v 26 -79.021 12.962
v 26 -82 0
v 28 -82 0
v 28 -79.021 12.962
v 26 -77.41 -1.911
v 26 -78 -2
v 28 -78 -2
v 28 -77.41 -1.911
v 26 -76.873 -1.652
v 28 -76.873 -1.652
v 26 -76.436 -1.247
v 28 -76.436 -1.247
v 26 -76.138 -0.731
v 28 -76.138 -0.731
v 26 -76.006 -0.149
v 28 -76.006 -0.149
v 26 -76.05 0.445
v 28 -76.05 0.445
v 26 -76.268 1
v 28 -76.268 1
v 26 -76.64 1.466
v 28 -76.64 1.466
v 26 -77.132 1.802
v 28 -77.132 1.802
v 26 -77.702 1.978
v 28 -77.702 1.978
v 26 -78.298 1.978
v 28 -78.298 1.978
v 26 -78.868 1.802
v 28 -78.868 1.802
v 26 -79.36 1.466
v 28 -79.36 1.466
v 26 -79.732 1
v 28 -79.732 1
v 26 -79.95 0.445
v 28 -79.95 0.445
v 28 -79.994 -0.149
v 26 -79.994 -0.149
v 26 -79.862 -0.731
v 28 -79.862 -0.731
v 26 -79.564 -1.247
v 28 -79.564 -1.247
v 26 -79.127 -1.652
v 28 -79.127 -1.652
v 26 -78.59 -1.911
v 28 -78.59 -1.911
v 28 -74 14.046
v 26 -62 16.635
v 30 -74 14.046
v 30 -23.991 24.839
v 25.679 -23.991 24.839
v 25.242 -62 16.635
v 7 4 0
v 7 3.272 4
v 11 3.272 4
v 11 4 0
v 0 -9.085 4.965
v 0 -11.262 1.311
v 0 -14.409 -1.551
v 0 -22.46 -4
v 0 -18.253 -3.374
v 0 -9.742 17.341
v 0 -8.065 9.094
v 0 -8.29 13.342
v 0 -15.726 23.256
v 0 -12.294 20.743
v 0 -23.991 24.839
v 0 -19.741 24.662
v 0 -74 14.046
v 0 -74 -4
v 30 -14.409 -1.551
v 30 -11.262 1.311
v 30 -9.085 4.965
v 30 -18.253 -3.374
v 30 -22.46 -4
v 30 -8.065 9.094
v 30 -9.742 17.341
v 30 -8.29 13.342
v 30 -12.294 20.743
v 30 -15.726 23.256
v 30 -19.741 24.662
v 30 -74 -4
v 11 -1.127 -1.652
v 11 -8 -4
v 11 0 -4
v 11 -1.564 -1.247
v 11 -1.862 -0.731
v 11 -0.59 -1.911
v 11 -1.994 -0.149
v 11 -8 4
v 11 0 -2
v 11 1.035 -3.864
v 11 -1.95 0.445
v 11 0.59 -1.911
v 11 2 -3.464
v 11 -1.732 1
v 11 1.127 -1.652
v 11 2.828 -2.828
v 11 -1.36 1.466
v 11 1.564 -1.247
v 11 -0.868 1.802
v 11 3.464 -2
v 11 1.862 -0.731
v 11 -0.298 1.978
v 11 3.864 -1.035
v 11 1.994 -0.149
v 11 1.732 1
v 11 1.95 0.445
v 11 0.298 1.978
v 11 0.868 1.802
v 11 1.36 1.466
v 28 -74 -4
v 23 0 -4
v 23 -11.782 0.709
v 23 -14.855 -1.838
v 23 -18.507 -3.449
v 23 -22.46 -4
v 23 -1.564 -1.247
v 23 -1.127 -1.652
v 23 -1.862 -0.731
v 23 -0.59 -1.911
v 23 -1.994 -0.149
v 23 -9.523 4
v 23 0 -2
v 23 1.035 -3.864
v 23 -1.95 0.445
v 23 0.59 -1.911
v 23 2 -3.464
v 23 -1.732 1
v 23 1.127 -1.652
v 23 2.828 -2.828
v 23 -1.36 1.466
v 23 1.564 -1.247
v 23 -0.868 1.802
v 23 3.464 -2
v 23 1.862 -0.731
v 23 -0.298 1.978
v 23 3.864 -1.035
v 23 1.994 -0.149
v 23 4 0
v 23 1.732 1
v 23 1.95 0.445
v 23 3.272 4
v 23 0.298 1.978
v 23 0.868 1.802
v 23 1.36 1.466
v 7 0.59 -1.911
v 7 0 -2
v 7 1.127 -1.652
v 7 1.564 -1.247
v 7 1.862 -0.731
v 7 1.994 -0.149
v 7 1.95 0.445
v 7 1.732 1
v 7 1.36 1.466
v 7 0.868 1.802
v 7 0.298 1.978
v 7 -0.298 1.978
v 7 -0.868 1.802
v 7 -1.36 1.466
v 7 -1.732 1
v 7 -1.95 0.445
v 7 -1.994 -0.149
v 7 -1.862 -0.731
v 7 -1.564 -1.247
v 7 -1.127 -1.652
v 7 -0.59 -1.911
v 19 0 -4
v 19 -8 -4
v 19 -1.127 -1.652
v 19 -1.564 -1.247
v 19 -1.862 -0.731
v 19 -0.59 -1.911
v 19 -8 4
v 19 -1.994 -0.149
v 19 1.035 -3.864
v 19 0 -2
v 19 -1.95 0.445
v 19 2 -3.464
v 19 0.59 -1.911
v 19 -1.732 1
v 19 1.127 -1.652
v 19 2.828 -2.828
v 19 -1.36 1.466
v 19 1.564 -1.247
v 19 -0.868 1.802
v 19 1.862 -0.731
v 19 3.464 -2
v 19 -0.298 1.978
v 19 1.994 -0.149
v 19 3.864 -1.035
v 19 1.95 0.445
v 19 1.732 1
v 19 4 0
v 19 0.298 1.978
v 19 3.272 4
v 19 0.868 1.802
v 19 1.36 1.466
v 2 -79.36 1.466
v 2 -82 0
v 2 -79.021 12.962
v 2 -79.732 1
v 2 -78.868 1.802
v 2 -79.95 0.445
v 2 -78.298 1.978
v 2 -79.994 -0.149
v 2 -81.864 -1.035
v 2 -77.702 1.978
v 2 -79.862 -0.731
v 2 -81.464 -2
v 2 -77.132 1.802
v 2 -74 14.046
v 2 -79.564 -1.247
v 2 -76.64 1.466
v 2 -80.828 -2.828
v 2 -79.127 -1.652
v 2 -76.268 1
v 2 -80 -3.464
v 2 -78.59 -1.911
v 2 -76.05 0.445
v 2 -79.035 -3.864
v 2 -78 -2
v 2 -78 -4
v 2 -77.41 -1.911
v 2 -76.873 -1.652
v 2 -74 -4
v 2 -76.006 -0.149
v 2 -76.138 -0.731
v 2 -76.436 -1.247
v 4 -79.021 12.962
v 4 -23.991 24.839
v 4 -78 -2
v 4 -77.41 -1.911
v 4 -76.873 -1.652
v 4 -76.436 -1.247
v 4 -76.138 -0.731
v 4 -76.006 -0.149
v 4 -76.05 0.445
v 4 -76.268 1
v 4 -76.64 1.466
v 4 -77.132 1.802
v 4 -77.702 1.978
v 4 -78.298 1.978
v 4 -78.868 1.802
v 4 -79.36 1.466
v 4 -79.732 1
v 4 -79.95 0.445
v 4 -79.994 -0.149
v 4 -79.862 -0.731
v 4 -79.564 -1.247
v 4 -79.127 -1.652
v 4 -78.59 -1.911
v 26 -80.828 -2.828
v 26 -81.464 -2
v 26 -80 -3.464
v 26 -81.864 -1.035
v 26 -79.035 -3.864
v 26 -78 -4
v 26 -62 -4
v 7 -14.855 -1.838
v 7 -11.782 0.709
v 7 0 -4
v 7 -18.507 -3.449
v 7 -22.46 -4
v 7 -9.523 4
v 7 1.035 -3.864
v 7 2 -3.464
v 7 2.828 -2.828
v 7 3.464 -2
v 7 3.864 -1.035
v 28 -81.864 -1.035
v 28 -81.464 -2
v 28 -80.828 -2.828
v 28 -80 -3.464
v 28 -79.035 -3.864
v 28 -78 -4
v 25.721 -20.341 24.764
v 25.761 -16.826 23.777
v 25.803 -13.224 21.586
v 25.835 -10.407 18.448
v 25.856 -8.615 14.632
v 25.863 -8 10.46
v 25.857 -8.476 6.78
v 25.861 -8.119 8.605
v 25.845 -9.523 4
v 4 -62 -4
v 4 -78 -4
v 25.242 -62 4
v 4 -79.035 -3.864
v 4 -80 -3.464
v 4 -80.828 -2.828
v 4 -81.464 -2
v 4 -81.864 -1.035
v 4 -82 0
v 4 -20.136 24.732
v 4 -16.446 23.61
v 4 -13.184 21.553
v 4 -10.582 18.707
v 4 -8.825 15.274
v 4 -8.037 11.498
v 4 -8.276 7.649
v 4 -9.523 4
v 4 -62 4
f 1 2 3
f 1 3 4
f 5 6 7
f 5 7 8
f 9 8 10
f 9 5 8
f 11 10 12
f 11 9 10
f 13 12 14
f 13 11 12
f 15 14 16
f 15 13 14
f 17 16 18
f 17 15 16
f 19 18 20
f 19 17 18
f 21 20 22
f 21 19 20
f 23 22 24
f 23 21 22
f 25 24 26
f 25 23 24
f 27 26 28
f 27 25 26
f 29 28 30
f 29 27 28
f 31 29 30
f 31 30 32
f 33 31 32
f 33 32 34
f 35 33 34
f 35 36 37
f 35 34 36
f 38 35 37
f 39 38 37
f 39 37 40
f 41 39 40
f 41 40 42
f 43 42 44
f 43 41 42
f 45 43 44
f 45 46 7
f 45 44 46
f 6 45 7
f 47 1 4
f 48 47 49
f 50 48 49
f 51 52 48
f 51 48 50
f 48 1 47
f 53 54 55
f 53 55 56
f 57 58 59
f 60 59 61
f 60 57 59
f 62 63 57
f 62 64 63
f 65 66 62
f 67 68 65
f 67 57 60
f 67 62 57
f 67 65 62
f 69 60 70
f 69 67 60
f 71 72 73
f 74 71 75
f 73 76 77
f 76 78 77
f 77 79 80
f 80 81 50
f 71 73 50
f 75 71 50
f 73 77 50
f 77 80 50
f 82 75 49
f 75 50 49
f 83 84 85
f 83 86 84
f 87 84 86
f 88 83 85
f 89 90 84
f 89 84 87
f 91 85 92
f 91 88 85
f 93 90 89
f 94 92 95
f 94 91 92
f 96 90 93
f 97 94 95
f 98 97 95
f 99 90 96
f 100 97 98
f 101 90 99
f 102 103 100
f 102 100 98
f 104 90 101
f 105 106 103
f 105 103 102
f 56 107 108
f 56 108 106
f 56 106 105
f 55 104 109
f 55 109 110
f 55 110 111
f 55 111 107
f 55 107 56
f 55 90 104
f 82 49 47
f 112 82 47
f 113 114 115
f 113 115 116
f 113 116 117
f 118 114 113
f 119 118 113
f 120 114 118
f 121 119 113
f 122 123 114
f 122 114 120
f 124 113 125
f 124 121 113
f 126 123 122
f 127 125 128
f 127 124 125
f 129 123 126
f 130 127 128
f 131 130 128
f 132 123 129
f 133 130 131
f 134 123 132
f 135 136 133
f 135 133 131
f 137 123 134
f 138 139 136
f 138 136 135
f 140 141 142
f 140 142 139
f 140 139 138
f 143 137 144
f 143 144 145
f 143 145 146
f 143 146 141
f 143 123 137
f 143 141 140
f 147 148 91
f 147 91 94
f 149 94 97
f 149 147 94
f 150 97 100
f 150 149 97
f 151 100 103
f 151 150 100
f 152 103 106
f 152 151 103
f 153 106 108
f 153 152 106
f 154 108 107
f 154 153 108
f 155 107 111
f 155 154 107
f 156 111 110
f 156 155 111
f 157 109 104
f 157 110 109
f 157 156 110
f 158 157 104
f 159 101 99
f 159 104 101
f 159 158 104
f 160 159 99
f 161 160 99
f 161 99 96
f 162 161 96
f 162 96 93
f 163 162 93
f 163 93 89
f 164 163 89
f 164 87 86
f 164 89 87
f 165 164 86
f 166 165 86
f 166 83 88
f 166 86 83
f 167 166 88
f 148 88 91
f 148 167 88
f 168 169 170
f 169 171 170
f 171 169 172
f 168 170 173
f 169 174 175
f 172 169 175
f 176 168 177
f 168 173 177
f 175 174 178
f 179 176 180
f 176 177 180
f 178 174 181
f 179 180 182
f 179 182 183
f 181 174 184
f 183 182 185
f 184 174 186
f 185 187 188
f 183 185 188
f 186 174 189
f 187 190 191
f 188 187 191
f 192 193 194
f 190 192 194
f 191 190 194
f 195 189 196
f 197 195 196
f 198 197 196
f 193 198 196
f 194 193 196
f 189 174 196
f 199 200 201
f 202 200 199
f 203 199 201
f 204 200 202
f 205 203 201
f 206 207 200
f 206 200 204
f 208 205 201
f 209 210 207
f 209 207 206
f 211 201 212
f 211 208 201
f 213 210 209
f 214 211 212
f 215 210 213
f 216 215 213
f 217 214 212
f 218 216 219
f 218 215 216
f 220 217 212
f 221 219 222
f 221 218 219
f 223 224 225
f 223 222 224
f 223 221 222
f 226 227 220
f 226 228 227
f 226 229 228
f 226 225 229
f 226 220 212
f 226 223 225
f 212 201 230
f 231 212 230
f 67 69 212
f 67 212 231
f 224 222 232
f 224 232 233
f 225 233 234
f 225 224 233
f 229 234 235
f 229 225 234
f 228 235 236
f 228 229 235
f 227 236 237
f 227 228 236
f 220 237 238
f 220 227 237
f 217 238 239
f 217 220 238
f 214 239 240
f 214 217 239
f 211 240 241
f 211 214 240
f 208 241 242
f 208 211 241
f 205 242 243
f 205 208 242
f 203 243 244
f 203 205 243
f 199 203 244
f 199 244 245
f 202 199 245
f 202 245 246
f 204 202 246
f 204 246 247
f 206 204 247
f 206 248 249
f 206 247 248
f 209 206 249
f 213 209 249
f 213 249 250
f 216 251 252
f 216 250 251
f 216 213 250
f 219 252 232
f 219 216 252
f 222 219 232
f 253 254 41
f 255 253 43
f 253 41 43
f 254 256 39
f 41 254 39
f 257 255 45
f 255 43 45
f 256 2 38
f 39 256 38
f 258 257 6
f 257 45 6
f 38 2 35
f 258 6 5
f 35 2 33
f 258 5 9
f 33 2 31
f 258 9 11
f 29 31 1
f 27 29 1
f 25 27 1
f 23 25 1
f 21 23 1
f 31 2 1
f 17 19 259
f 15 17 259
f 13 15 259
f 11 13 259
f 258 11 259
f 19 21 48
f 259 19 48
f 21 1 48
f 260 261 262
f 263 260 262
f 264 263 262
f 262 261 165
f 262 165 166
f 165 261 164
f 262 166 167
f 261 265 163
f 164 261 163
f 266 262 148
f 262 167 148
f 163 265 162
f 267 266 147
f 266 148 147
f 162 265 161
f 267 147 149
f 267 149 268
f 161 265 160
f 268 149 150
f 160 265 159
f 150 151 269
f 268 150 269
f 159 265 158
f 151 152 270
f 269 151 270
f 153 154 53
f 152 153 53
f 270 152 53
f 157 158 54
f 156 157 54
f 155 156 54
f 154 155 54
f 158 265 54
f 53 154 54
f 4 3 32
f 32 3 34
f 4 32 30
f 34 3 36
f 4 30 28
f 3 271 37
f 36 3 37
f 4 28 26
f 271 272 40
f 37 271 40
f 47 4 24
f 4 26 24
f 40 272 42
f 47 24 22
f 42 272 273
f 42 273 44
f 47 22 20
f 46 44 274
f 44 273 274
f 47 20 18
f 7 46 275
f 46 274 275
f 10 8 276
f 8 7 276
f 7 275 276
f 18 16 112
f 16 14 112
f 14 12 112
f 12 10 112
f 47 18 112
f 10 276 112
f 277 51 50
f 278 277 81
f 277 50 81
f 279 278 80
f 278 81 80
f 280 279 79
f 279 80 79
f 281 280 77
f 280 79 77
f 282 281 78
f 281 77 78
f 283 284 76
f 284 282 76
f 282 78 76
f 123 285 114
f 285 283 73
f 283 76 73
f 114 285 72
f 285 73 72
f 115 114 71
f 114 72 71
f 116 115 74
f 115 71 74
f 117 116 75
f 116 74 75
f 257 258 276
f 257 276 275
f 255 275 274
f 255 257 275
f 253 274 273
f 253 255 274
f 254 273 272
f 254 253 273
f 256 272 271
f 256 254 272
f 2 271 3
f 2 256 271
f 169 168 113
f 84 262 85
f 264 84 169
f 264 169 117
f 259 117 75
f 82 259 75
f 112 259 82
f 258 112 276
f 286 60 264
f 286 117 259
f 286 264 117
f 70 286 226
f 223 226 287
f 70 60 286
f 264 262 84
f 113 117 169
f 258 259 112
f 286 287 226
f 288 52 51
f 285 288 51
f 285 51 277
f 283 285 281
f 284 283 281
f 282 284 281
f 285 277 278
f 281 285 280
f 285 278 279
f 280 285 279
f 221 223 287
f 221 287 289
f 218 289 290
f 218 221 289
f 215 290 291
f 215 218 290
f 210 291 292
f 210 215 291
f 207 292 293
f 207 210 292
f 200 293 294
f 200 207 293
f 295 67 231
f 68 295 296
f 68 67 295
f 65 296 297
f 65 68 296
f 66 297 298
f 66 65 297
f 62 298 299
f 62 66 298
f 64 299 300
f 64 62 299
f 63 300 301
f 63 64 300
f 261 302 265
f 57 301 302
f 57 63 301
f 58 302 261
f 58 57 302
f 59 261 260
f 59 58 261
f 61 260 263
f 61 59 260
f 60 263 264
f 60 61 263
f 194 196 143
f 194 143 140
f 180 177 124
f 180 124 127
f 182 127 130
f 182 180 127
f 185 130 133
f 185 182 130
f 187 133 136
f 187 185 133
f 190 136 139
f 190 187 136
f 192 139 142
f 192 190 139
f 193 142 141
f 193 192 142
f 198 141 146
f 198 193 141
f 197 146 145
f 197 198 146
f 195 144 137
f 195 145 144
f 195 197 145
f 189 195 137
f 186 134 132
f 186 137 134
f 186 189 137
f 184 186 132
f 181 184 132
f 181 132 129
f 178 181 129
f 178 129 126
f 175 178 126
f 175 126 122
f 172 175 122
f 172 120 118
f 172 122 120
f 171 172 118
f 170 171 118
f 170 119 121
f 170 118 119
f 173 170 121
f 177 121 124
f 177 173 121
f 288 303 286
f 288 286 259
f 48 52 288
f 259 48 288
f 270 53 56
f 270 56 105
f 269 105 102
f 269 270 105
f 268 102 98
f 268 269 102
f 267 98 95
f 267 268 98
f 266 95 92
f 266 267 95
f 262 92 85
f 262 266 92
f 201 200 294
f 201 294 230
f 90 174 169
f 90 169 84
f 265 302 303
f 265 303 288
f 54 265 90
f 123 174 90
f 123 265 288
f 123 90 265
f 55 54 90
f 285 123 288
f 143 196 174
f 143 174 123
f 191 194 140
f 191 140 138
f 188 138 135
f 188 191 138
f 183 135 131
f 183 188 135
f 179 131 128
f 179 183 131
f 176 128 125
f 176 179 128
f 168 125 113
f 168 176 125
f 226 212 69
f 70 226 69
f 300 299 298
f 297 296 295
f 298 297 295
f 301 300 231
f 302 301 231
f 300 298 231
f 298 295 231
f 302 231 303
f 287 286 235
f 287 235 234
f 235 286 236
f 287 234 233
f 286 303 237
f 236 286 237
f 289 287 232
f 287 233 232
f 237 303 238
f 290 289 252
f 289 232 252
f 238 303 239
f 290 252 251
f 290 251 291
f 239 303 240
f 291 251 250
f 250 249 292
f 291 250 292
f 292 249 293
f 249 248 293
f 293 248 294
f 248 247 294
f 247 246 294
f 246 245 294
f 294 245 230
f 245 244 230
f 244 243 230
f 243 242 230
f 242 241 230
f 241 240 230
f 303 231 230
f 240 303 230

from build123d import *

# Parameters (mm, degrees)
SKETCH2_R                = 2
BOSS_EXTRUDE1_DEPTH      = 30
SKETCH3_W                = 7
SKETCH3_H                = 12
SKETCH3_W_2              = 8
CUT_EXTRUDE1_DEPTH       = 60
CUT_EXTRUDE2_DEPTH       = 42
CUT_EXTRUDE5_DEPTH       = 70
CUT_EXTRUDE9_DEPTH       = 70
CUT_EXTRUDE10_DEPTH      = 7
CUT_EXTRUDE11_DEPTH      = 17
CUT_EXTRUDE11_DEPTH_BACK = 17
SKETCH9_W                = 8
SKETCH9_H                = 2


with BuildPart() as part:
    # Sketch2 → Boss-Extrude1 (new body)
    with BuildSketch(Plane.YZ):
        with BuildLine():
            Line((0, -4), (-78, -4))
            ThreePointArc((-78, -4), (-80.828427125, -2.828427125), (-82, 0))
            Line((-82, 0), (-78.449171497, 15.448029549))
            ThreePointArc((-78.449171497, 15.448029549), (-77.745781061, 16.56461802), (-76.5, 17))
            Line((-76.5, 17), (-5.35, 33.4))
            ThreePointArc((-5.35, 33.4), (-2.521572875, 32.228427125), (-1.35, 29.4))
            Line((-1.35, 29.4), (4, 0))
            ThreePointArc((4, 0), (2.828427125, -2.828427125), (0, -4))
        make_face()
        with Locations(Location((0, 0, 0), (0, 0, 270))):
            Circle(SKETCH2_R, mode=Mode.SUBTRACT)
        with Locations(Location((-78, 0, 0), (0, 0, 270))):
            Circle(SKETCH2_R, mode=Mode.SUBTRACT)
    extrude(amount=BOSS_EXTRUDE1_DEPTH)

    # Sketch3 → Cut-Extrude1 (cut)
    with BuildSketch(Plane(origin=(0, 0, 46), x_dir=(-1, 0, 0), z_dir=(0, 0, -1))):
        Polygon((0, 0), (0, 4), (-7, 4), (-7, -8), (0, -8), align=None)
        with Locations((-26.5, -2)):
            Rectangle(SKETCH3_W, SKETCH3_H)
        with Locations((-15, -2)):
            Rectangle(SKETCH3_W_2, SKETCH3_H)
    extrude(amount=CUT_EXTRUDE1_DEPTH, mode=Mode.SUBTRACT)

    # Sketch4 → Cut-Extrude2 (cut)
    with BuildSketch(Plane(origin=(0, 0, 46), x_dir=(-1, 0, 0), z_dir=(0, 0, -1))):
        Polygon((-15, 3.93673286), (-4, 3.93673286), (-4, -82.06326714), (-25.011555161, -82.06326714), (-26, 3.93673286), align=None)
    extrude(amount=CUT_EXTRUDE2_DEPTH, mode=Mode.SUBTRACT)

    # Sketch6 → Cut-Extrude5 (cut)
    with BuildSketch(Plane(origin=(0, 0, 46), x_dir=(-1, 0, 0), z_dir=(0, 0, -1))):
        Polygon((-15, -62), (-4, -62), (-4, -102), (-26, -102), (-26, -62), align=None)
    extrude(amount=CUT_EXTRUDE5_DEPTH, mode=Mode.SUBTRACT)

    # Sketch7 → Cut-Extrude9 (cut)
    with BuildSketch(Plane(origin=(0, 0, 0), x_dir=(0, -1, 0), z_dir=(-1, 0, 0))):
        with BuildLine():
            Line((8, 28.29), (8, 32.789177793))
            Line((8, 32.789177793), (76.5, 17))
            ThreePointArc((76.5, 17), (77.745781061, 16.56461802), (78.449171497, 15.448029549))
            Line((78.449171497, 15.448029549), (79.020603501, 12.961990453))
            Line((79.020603501, 12.961990453), (8, 28.29))
        make_face()
    extrude(amount=-CUT_EXTRUDE9_DEPTH, mode=Mode.SUBTRACT)

    # Sketch8 → Cut-Extrude10 (cut)
    with BuildSketch(Plane(origin=(0, 0, 0), x_dir=(0, -1, 0), z_dir=(-1, 0, 0))):
        with BuildLine():
            Line((8, 28.29), (25.445762173, 24.608385924))
            ThreePointArc((25.445762173, 24.608385924), (8.078114511, 11.960989597), (22.46, -4))
            Line((22.46, -4), (-8.040982842, -4))
            Line((-8.040982842, -4), (-8.040982842, 32.936104238))
            Line((-8.040982842, 32.936104238), (8, 28.29))
        make_face()
    cut_extrude10 = extrude(amount=-CUT_EXTRUDE10_DEPTH, mode=Mode.SUBTRACT)

    # Mirror1: Cut-Extrude10 across plane
    add(cut_extrude10.mirror(Plane(origin=(15, 0, 0), x_dir=(0, 0, 1), z_dir=(1, 0, 0))), mode=Mode.SUBTRACT)

    # Sketch9 → Cut-Extrude11 (cut, two sides: drawn at the far end of the back side and taken through both)
    with BuildSketch(Plane(origin=(0, 0, 0), x_dir=(0, 1, 0), z_dir=(0, 0, 1)).offset(-CUT_EXTRUDE11_DEPTH_BACK)):
        with Locations((-78, -1)):
            Rectangle(SKETCH9_W, SKETCH9_H)
        with Locations((-78, -29)):
            Rectangle(SKETCH9_W, SKETCH9_H)
    extrude(amount=CUT_EXTRUDE11_DEPTH + CUT_EXTRUDE11_DEPTH_BACK, mode=Mode.SUBTRACT)


solid = part.part
